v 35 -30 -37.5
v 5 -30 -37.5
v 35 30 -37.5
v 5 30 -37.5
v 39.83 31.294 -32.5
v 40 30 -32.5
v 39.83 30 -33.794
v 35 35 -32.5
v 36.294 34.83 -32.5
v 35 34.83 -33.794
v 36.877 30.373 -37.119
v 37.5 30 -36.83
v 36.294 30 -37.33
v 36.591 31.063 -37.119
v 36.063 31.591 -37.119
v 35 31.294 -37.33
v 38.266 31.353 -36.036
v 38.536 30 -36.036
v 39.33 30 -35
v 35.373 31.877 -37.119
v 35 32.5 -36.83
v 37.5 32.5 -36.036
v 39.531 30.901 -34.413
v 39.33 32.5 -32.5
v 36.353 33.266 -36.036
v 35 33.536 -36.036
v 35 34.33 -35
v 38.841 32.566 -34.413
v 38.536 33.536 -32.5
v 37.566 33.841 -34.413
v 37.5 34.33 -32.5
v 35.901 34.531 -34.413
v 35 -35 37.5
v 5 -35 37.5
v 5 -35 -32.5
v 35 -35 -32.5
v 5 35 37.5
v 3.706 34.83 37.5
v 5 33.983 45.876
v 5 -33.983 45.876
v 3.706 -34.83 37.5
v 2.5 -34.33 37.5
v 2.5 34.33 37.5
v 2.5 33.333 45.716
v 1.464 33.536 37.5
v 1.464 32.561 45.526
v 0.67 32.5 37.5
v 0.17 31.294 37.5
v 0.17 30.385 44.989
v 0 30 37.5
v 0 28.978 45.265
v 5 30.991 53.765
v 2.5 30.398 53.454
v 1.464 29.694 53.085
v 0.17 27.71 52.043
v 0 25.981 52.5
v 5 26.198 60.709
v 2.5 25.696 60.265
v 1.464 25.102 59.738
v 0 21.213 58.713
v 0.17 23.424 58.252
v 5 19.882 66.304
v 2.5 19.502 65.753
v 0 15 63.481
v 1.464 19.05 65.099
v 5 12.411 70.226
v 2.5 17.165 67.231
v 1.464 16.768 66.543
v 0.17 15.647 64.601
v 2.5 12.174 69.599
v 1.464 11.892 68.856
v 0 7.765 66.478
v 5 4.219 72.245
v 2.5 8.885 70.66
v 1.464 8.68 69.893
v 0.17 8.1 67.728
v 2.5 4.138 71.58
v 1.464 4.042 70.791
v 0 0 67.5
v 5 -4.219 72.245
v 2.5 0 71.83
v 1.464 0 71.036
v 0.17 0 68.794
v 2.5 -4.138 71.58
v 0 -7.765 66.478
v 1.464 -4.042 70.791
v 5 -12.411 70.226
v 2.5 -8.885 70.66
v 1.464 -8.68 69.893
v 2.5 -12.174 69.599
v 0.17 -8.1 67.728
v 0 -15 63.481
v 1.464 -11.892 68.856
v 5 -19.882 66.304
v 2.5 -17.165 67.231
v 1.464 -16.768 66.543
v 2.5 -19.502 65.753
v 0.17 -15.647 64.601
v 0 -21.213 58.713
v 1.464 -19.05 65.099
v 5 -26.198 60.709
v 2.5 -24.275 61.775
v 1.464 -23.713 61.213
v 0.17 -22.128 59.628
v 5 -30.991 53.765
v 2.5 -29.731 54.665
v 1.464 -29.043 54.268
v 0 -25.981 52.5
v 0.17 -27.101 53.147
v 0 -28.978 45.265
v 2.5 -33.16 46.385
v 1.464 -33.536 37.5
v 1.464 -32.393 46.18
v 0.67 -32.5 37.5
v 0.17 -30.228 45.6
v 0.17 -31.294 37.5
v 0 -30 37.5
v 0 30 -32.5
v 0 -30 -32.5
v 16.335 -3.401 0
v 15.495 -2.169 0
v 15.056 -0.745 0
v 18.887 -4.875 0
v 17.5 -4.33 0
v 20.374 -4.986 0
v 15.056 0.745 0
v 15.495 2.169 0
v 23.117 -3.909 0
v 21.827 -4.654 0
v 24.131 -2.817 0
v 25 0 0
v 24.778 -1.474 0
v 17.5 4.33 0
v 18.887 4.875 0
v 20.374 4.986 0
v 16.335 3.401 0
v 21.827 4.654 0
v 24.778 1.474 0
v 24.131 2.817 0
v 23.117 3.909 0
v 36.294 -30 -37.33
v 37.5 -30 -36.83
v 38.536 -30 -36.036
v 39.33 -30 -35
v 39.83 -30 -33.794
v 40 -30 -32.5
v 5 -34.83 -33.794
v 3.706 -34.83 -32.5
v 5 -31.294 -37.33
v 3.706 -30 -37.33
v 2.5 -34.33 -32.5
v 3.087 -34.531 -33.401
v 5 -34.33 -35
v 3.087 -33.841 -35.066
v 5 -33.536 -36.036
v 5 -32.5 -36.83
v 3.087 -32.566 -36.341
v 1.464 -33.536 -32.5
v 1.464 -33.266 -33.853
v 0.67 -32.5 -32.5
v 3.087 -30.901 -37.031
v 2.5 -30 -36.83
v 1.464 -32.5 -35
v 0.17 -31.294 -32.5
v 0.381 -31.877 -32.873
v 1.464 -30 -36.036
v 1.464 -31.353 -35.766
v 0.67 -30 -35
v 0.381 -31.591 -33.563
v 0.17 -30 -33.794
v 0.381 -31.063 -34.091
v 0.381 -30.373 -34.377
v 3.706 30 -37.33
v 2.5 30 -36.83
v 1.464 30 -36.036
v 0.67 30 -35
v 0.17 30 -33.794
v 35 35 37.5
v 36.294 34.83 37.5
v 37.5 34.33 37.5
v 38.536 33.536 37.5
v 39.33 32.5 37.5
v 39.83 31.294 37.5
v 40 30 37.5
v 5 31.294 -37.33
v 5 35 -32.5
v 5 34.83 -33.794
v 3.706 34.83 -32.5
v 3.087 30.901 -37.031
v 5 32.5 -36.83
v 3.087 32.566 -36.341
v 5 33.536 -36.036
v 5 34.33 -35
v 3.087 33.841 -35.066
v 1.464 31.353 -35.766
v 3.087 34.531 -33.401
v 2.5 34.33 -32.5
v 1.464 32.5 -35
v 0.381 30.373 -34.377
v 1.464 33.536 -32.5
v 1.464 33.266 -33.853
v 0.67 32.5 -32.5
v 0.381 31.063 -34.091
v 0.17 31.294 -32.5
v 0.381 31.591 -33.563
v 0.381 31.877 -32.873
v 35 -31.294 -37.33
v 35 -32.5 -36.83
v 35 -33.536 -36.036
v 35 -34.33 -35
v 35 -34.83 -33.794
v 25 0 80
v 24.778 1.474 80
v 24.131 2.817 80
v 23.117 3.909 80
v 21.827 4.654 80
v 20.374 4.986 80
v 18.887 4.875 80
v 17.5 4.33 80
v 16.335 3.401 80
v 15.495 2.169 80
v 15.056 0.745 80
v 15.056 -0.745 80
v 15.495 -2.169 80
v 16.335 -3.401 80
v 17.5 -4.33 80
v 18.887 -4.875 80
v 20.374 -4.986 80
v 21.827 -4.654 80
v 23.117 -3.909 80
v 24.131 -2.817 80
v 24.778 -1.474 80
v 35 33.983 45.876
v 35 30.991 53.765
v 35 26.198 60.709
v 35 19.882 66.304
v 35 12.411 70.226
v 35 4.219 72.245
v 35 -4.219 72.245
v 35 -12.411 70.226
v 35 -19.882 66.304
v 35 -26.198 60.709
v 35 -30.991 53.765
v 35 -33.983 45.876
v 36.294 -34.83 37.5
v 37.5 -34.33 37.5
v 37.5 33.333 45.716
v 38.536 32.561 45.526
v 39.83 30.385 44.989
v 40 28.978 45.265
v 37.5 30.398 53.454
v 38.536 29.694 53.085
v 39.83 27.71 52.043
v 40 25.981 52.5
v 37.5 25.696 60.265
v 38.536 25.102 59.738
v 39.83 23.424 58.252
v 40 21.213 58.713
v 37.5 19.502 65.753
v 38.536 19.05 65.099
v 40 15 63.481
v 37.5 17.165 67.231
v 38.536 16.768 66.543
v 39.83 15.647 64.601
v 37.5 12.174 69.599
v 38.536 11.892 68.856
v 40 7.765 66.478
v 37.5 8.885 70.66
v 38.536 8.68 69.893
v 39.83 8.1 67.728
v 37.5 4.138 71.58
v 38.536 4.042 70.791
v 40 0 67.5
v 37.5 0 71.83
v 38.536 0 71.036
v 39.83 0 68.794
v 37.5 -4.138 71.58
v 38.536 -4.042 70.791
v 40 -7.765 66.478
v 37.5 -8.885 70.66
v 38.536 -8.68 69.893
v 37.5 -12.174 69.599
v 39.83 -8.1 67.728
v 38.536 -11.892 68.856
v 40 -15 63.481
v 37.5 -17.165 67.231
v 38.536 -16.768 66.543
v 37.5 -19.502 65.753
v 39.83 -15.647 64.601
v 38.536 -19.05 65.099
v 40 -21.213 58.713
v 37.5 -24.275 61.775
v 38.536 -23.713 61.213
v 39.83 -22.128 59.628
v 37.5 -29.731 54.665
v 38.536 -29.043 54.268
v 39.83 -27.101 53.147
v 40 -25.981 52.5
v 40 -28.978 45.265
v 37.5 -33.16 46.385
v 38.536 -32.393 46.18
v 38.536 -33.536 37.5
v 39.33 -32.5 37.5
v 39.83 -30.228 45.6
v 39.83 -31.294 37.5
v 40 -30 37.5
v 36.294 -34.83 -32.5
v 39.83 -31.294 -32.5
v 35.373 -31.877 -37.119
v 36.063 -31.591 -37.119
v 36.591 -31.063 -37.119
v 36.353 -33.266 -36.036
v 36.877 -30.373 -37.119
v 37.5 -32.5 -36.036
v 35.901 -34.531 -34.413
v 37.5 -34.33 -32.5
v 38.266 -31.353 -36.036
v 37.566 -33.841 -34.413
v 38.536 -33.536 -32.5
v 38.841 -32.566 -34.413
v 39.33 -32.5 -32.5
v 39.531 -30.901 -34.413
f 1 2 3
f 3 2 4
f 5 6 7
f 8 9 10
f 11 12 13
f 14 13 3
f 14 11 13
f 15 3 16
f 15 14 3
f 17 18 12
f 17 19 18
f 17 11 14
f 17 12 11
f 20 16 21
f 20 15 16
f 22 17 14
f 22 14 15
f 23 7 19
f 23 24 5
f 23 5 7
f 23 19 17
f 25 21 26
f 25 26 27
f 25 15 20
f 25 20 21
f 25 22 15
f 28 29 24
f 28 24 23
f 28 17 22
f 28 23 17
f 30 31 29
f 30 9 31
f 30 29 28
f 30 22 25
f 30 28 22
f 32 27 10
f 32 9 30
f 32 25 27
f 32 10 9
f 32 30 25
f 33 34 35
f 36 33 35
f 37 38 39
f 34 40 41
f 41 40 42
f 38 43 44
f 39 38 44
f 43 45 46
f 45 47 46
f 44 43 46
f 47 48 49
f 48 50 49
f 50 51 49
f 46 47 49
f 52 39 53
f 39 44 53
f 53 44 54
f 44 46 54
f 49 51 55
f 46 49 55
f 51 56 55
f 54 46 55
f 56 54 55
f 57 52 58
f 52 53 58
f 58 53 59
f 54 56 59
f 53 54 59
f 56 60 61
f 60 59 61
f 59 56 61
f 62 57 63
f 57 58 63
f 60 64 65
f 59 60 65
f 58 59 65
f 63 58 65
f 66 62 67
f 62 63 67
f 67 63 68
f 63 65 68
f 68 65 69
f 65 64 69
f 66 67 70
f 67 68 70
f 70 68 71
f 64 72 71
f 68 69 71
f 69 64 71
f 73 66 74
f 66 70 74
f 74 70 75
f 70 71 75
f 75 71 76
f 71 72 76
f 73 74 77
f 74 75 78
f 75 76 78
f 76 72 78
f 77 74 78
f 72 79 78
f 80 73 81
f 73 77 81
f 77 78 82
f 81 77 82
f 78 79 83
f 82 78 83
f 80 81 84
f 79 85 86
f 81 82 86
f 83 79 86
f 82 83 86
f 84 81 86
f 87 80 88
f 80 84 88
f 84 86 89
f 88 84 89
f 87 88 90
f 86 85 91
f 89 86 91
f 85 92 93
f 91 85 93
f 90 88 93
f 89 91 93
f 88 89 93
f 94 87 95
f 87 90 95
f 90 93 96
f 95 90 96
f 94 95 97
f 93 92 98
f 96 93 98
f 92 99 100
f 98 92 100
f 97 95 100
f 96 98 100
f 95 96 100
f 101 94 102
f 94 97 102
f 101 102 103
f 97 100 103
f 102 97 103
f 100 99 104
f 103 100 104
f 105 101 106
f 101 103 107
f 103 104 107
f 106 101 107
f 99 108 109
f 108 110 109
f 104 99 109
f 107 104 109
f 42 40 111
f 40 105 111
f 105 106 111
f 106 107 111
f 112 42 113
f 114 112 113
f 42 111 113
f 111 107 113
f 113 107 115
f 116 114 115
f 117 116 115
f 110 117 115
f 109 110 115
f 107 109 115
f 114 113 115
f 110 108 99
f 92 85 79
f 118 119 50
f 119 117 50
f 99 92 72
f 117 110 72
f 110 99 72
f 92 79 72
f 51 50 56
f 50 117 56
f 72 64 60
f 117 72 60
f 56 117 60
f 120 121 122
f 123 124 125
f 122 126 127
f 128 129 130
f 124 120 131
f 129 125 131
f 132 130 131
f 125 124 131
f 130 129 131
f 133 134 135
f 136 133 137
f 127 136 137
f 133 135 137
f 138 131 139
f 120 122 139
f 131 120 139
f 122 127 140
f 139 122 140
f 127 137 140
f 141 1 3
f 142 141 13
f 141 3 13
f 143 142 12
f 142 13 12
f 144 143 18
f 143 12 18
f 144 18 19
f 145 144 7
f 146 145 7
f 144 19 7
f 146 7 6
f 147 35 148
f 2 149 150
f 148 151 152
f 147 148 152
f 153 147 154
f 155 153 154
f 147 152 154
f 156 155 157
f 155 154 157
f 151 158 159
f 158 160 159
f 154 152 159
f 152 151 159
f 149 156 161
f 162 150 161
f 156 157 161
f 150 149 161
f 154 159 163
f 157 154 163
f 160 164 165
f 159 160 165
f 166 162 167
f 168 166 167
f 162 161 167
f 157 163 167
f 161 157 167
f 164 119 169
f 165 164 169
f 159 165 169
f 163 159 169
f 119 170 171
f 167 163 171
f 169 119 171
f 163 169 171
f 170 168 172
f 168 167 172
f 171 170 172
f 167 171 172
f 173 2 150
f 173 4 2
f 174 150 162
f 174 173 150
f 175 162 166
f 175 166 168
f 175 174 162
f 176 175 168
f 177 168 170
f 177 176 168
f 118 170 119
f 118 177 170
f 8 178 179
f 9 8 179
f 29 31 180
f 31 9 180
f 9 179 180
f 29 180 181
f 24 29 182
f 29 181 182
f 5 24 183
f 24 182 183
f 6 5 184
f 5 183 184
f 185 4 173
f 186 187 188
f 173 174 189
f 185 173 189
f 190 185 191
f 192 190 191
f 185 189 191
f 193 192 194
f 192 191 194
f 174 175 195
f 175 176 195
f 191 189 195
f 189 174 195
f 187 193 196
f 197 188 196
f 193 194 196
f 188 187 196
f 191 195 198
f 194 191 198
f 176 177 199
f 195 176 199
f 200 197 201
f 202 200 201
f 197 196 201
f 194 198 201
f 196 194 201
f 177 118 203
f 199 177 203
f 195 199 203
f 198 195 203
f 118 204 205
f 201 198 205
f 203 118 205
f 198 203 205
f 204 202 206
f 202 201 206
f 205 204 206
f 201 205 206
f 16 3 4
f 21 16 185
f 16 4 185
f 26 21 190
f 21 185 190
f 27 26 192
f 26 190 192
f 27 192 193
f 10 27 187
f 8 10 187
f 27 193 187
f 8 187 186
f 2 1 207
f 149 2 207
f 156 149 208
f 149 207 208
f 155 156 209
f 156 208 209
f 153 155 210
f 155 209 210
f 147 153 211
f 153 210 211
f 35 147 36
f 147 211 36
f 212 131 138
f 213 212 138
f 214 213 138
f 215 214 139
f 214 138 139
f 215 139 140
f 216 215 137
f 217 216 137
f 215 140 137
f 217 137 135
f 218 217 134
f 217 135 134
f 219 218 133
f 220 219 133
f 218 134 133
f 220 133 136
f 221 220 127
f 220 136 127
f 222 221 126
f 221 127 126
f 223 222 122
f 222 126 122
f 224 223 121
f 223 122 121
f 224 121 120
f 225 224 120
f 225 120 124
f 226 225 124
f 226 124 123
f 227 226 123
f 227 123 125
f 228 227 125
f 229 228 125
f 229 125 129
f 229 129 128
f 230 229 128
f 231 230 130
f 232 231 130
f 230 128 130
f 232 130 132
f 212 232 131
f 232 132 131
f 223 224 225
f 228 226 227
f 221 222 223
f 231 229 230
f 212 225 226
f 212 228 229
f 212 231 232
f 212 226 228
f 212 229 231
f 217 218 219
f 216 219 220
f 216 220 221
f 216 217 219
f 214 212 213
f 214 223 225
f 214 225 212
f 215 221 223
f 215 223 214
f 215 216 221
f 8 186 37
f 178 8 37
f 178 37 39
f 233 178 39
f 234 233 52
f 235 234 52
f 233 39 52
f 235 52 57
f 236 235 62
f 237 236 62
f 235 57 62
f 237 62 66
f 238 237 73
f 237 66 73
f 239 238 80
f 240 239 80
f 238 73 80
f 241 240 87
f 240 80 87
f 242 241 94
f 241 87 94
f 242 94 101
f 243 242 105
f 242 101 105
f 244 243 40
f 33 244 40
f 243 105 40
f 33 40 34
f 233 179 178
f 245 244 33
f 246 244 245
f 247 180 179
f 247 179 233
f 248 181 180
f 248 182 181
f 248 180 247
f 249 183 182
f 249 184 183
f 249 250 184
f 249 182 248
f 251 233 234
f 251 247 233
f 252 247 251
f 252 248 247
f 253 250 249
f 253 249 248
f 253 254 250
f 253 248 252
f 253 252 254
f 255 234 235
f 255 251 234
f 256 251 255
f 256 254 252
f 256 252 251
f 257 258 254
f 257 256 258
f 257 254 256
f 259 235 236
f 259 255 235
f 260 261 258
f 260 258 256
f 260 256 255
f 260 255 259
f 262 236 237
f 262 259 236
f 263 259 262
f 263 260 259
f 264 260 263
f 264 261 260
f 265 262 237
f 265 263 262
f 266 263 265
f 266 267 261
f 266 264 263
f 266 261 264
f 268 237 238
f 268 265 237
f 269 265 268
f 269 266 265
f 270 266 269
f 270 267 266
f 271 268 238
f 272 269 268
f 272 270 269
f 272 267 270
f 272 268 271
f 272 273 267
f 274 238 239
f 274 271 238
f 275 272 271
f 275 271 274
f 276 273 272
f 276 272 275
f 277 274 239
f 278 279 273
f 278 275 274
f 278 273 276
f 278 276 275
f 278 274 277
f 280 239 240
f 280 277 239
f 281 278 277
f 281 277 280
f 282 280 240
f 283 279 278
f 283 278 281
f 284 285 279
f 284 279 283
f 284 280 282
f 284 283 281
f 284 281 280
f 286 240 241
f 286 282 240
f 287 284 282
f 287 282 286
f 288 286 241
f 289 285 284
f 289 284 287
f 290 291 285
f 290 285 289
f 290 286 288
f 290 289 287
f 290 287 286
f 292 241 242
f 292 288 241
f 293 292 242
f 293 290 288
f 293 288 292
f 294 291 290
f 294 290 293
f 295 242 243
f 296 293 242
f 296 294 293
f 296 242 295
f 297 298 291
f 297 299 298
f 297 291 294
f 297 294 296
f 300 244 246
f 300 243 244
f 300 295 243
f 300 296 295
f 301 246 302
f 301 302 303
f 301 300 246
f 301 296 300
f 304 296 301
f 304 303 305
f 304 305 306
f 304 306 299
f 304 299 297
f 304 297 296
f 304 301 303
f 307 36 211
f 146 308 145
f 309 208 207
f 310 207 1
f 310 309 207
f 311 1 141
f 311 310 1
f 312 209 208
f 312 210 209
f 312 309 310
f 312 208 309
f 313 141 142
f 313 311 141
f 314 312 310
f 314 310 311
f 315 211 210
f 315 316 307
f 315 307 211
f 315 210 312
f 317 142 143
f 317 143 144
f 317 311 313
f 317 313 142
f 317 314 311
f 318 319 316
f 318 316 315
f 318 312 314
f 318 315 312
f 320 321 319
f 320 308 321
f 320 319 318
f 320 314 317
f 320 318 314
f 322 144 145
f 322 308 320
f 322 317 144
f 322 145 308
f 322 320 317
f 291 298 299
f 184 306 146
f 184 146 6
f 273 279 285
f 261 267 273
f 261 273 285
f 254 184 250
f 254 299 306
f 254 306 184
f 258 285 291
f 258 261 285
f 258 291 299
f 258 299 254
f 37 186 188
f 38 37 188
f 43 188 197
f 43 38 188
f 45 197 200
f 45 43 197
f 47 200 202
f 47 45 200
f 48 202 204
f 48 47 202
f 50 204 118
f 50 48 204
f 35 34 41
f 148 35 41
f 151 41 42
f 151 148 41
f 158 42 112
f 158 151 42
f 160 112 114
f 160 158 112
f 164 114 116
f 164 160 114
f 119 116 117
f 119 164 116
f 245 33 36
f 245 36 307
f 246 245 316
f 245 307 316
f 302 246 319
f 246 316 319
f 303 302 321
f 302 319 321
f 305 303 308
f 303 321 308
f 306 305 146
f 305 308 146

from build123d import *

# Parameters (mm, degrees)
F1_DEPTH = 40
F2_R     = 5
F3_R     = 5
F4_R     = 5
F5_R     = 5
F6_DEPTH = 80


with BuildPart() as f1:
    # F0 (on Right) → F1 (new body)
    with BuildSketch(Plane.YZ):
        with BuildLine():
            Line((-35, -37.5), (35, -37.5))
            Line((35, -37.5), (35, 37.5))
            ThreePointArc((35, 37.5), (0, 2.5), (-35, 37.5))
            Line((-35, 37.5), (-35, -37.5))
        make_face()
        with BuildLine():
            ThreePointArc((-35, 37.5), (0, 2.5), (35, 37.5))
            Line((35, 37.5), (-35, 37.5))
        make_face()
        with BuildLine():
            Line((-35, 37.5), (35, 37.5))
            ThreePointArc((35, 37.5), (0, 72.5), (-35, 37.5))
        make_face()
    extrude(amount=F1_DEPTH)

    # F2
    f2_edges = [f1.edges().sort_by_distance(p)[0] for p in [
        (40, -35, 0),
    ]]
    fillet(f2_edges, radius=F2_R)

    # F3
    f3_edges = [f1.edges().sort_by_distance(p)[0] for p in [
        (17.5, -35, -37.5),
    ]]
    fillet(f3_edges, radius=F3_R)

    # F4
    f4_edges = [f1.edges().sort_by_distance(p)[0] for p in [
        (0, 0, -37.5),
    ]]
    fillet(f4_edges, radius=F4_R)


with BuildPart() as f6:
    # F5 (on Top) → F6 (new body)
    with BuildSketch(Plane.XY):
        with Locations((20, 0)):
            Circle(F5_R)
    extrude(amount=F6_DEPTH)


solid = Compound([f1.part, f6.part])
